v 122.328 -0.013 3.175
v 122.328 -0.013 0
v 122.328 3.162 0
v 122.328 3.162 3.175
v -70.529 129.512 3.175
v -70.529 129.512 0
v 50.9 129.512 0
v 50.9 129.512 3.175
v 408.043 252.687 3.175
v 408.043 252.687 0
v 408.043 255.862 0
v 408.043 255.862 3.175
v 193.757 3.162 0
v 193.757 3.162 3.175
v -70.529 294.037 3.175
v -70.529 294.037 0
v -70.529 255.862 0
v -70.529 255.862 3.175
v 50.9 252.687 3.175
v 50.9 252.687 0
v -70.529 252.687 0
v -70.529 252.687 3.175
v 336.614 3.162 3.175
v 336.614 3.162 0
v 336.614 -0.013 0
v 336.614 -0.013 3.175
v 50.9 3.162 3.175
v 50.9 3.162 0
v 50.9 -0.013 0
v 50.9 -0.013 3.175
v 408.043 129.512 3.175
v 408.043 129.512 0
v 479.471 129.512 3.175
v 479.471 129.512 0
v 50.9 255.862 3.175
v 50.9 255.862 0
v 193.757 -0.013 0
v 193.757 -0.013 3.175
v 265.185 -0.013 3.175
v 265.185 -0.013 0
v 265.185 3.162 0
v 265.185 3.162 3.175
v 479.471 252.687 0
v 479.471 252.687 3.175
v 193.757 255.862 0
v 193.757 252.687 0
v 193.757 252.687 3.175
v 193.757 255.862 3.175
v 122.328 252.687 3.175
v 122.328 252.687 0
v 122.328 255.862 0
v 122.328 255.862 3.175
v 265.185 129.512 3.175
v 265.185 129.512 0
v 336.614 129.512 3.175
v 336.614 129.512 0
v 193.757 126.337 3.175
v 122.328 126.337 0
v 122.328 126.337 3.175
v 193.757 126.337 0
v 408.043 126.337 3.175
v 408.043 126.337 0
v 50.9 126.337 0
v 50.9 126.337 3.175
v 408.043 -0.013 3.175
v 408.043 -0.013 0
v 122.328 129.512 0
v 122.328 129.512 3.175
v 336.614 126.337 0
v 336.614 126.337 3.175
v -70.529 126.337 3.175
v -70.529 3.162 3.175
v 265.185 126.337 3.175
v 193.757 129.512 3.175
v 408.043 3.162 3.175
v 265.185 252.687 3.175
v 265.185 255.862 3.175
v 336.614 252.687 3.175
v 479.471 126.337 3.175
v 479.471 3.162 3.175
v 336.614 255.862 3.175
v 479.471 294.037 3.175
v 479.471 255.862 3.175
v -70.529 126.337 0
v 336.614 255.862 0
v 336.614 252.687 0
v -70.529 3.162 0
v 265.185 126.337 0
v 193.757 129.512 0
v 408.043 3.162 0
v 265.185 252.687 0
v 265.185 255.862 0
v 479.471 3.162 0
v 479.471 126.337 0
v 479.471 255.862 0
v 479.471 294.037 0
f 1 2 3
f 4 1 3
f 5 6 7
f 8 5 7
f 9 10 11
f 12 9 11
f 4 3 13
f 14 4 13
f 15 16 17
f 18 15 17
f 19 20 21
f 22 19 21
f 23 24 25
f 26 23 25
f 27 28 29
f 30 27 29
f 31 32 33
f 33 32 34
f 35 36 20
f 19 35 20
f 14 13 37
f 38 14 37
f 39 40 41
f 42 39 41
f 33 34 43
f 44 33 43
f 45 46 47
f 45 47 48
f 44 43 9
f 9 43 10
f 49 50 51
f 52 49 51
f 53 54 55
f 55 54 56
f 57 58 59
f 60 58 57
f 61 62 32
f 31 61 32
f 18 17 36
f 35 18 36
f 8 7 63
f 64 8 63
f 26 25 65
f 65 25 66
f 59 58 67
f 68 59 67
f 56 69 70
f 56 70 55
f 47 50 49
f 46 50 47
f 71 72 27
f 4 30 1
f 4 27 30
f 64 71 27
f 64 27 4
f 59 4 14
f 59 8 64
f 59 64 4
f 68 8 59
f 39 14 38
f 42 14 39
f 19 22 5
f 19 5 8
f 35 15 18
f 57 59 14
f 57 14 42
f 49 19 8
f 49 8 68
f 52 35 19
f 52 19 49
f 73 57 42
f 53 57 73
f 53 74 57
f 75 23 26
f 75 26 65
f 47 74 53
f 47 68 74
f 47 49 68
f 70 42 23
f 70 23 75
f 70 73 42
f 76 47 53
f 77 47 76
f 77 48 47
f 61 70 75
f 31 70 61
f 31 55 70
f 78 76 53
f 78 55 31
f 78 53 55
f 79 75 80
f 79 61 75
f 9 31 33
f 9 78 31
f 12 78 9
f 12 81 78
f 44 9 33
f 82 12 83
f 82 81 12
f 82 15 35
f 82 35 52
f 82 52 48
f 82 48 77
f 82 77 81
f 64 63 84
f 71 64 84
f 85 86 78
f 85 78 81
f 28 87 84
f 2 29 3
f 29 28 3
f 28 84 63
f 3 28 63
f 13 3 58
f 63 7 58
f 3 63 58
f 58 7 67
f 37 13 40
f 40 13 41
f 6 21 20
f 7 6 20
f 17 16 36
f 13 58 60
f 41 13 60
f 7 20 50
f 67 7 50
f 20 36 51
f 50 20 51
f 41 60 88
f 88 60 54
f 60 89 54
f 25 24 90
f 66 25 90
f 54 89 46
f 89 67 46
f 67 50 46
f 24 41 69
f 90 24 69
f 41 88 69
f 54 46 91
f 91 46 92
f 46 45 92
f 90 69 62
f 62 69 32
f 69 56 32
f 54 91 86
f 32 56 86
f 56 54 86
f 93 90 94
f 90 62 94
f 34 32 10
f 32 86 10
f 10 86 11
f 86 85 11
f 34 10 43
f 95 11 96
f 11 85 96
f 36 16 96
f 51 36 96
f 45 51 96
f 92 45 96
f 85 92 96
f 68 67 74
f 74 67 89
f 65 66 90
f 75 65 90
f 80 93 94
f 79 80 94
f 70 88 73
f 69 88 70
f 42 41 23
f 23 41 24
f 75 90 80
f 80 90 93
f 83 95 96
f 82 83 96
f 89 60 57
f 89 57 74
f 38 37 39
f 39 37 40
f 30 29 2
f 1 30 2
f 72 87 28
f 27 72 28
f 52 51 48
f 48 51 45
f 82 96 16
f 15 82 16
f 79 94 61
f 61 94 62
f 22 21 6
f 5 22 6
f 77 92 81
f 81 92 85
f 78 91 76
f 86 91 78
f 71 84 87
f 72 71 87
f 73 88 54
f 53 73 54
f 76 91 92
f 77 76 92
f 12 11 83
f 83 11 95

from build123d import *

# Parameters (mm, degrees)
SKETCH1_W           = 71.428571428
SKETCH1_H           = 3.175
SKETCH1_W_2         = 71.428571429
BOSS_EXTRUDE1_DEPTH = 3.175


with BuildPart() as part:
    # Sketch1 → Boss-Extrude1 (new body)
    with BuildSketch(Plane.XY):
        Polygon((50.899754495, -0.012509515), (122.328325923, -0.012509515), (122.328325923, 3.162490485), (193.756897352, 3.162490485), (193.756897352, -0.012509515), (265.185468781, -0.012509515), (265.185468781, 3.162490485), (336.614040209, 3.162490485), (336.614040209, -0.012509515), (408.042611638, -0.012509515), (408.042611638, 3.162490485), (479.471183066, 3.162490485), (479.471183066, 126.337490485), (408.042611638, 126.337490485), (408.042611638, 129.512490485), (479.471183066, 129.512490485), (479.471183066, 252.687490485), (408.042611638, 252.687490485), (408.042611638, 255.862490485), (479.471183066, 255.862490485), (479.471183066, 294.037490485), (166.471183066, 294.037490485), (-20.528816934, 294.037490485), (-70.528816934, 294.037490485), (-70.528816934, 255.862490485), (50.899754495, 255.862490485), (50.899754495, 252.687490485), (-70.528816934, 252.687490485), (-70.528816934, 129.512490485), (50.899754495, 129.512490485), (50.899754495, 126.337490485), (-70.528816934, 126.337490485), (-70.528816934, 3.162490485), (50.899754495, 3.162490485), align=None)
        with Locations((300.899754495, 127.924990485)):
            Rectangle(SKETCH1_W, SKETCH1_H, mode=Mode.SUBTRACT)
        with Locations((300.899754495, 254.274990485)):
            Rectangle(SKETCH1_W, SKETCH1_H, mode=Mode.SUBTRACT)
        with Locations((158.042611638, 127.924990485)):
            Rectangle(SKETCH1_W_2, SKETCH1_H, mode=Mode.SUBTRACT)
        with Locations((158.042611638, 254.274990485)):
            Rectangle(SKETCH1_W_2, SKETCH1_H, mode=Mode.SUBTRACT)
    extrude(amount=BOSS_EXTRUDE1_DEPTH)


solid = part.part
